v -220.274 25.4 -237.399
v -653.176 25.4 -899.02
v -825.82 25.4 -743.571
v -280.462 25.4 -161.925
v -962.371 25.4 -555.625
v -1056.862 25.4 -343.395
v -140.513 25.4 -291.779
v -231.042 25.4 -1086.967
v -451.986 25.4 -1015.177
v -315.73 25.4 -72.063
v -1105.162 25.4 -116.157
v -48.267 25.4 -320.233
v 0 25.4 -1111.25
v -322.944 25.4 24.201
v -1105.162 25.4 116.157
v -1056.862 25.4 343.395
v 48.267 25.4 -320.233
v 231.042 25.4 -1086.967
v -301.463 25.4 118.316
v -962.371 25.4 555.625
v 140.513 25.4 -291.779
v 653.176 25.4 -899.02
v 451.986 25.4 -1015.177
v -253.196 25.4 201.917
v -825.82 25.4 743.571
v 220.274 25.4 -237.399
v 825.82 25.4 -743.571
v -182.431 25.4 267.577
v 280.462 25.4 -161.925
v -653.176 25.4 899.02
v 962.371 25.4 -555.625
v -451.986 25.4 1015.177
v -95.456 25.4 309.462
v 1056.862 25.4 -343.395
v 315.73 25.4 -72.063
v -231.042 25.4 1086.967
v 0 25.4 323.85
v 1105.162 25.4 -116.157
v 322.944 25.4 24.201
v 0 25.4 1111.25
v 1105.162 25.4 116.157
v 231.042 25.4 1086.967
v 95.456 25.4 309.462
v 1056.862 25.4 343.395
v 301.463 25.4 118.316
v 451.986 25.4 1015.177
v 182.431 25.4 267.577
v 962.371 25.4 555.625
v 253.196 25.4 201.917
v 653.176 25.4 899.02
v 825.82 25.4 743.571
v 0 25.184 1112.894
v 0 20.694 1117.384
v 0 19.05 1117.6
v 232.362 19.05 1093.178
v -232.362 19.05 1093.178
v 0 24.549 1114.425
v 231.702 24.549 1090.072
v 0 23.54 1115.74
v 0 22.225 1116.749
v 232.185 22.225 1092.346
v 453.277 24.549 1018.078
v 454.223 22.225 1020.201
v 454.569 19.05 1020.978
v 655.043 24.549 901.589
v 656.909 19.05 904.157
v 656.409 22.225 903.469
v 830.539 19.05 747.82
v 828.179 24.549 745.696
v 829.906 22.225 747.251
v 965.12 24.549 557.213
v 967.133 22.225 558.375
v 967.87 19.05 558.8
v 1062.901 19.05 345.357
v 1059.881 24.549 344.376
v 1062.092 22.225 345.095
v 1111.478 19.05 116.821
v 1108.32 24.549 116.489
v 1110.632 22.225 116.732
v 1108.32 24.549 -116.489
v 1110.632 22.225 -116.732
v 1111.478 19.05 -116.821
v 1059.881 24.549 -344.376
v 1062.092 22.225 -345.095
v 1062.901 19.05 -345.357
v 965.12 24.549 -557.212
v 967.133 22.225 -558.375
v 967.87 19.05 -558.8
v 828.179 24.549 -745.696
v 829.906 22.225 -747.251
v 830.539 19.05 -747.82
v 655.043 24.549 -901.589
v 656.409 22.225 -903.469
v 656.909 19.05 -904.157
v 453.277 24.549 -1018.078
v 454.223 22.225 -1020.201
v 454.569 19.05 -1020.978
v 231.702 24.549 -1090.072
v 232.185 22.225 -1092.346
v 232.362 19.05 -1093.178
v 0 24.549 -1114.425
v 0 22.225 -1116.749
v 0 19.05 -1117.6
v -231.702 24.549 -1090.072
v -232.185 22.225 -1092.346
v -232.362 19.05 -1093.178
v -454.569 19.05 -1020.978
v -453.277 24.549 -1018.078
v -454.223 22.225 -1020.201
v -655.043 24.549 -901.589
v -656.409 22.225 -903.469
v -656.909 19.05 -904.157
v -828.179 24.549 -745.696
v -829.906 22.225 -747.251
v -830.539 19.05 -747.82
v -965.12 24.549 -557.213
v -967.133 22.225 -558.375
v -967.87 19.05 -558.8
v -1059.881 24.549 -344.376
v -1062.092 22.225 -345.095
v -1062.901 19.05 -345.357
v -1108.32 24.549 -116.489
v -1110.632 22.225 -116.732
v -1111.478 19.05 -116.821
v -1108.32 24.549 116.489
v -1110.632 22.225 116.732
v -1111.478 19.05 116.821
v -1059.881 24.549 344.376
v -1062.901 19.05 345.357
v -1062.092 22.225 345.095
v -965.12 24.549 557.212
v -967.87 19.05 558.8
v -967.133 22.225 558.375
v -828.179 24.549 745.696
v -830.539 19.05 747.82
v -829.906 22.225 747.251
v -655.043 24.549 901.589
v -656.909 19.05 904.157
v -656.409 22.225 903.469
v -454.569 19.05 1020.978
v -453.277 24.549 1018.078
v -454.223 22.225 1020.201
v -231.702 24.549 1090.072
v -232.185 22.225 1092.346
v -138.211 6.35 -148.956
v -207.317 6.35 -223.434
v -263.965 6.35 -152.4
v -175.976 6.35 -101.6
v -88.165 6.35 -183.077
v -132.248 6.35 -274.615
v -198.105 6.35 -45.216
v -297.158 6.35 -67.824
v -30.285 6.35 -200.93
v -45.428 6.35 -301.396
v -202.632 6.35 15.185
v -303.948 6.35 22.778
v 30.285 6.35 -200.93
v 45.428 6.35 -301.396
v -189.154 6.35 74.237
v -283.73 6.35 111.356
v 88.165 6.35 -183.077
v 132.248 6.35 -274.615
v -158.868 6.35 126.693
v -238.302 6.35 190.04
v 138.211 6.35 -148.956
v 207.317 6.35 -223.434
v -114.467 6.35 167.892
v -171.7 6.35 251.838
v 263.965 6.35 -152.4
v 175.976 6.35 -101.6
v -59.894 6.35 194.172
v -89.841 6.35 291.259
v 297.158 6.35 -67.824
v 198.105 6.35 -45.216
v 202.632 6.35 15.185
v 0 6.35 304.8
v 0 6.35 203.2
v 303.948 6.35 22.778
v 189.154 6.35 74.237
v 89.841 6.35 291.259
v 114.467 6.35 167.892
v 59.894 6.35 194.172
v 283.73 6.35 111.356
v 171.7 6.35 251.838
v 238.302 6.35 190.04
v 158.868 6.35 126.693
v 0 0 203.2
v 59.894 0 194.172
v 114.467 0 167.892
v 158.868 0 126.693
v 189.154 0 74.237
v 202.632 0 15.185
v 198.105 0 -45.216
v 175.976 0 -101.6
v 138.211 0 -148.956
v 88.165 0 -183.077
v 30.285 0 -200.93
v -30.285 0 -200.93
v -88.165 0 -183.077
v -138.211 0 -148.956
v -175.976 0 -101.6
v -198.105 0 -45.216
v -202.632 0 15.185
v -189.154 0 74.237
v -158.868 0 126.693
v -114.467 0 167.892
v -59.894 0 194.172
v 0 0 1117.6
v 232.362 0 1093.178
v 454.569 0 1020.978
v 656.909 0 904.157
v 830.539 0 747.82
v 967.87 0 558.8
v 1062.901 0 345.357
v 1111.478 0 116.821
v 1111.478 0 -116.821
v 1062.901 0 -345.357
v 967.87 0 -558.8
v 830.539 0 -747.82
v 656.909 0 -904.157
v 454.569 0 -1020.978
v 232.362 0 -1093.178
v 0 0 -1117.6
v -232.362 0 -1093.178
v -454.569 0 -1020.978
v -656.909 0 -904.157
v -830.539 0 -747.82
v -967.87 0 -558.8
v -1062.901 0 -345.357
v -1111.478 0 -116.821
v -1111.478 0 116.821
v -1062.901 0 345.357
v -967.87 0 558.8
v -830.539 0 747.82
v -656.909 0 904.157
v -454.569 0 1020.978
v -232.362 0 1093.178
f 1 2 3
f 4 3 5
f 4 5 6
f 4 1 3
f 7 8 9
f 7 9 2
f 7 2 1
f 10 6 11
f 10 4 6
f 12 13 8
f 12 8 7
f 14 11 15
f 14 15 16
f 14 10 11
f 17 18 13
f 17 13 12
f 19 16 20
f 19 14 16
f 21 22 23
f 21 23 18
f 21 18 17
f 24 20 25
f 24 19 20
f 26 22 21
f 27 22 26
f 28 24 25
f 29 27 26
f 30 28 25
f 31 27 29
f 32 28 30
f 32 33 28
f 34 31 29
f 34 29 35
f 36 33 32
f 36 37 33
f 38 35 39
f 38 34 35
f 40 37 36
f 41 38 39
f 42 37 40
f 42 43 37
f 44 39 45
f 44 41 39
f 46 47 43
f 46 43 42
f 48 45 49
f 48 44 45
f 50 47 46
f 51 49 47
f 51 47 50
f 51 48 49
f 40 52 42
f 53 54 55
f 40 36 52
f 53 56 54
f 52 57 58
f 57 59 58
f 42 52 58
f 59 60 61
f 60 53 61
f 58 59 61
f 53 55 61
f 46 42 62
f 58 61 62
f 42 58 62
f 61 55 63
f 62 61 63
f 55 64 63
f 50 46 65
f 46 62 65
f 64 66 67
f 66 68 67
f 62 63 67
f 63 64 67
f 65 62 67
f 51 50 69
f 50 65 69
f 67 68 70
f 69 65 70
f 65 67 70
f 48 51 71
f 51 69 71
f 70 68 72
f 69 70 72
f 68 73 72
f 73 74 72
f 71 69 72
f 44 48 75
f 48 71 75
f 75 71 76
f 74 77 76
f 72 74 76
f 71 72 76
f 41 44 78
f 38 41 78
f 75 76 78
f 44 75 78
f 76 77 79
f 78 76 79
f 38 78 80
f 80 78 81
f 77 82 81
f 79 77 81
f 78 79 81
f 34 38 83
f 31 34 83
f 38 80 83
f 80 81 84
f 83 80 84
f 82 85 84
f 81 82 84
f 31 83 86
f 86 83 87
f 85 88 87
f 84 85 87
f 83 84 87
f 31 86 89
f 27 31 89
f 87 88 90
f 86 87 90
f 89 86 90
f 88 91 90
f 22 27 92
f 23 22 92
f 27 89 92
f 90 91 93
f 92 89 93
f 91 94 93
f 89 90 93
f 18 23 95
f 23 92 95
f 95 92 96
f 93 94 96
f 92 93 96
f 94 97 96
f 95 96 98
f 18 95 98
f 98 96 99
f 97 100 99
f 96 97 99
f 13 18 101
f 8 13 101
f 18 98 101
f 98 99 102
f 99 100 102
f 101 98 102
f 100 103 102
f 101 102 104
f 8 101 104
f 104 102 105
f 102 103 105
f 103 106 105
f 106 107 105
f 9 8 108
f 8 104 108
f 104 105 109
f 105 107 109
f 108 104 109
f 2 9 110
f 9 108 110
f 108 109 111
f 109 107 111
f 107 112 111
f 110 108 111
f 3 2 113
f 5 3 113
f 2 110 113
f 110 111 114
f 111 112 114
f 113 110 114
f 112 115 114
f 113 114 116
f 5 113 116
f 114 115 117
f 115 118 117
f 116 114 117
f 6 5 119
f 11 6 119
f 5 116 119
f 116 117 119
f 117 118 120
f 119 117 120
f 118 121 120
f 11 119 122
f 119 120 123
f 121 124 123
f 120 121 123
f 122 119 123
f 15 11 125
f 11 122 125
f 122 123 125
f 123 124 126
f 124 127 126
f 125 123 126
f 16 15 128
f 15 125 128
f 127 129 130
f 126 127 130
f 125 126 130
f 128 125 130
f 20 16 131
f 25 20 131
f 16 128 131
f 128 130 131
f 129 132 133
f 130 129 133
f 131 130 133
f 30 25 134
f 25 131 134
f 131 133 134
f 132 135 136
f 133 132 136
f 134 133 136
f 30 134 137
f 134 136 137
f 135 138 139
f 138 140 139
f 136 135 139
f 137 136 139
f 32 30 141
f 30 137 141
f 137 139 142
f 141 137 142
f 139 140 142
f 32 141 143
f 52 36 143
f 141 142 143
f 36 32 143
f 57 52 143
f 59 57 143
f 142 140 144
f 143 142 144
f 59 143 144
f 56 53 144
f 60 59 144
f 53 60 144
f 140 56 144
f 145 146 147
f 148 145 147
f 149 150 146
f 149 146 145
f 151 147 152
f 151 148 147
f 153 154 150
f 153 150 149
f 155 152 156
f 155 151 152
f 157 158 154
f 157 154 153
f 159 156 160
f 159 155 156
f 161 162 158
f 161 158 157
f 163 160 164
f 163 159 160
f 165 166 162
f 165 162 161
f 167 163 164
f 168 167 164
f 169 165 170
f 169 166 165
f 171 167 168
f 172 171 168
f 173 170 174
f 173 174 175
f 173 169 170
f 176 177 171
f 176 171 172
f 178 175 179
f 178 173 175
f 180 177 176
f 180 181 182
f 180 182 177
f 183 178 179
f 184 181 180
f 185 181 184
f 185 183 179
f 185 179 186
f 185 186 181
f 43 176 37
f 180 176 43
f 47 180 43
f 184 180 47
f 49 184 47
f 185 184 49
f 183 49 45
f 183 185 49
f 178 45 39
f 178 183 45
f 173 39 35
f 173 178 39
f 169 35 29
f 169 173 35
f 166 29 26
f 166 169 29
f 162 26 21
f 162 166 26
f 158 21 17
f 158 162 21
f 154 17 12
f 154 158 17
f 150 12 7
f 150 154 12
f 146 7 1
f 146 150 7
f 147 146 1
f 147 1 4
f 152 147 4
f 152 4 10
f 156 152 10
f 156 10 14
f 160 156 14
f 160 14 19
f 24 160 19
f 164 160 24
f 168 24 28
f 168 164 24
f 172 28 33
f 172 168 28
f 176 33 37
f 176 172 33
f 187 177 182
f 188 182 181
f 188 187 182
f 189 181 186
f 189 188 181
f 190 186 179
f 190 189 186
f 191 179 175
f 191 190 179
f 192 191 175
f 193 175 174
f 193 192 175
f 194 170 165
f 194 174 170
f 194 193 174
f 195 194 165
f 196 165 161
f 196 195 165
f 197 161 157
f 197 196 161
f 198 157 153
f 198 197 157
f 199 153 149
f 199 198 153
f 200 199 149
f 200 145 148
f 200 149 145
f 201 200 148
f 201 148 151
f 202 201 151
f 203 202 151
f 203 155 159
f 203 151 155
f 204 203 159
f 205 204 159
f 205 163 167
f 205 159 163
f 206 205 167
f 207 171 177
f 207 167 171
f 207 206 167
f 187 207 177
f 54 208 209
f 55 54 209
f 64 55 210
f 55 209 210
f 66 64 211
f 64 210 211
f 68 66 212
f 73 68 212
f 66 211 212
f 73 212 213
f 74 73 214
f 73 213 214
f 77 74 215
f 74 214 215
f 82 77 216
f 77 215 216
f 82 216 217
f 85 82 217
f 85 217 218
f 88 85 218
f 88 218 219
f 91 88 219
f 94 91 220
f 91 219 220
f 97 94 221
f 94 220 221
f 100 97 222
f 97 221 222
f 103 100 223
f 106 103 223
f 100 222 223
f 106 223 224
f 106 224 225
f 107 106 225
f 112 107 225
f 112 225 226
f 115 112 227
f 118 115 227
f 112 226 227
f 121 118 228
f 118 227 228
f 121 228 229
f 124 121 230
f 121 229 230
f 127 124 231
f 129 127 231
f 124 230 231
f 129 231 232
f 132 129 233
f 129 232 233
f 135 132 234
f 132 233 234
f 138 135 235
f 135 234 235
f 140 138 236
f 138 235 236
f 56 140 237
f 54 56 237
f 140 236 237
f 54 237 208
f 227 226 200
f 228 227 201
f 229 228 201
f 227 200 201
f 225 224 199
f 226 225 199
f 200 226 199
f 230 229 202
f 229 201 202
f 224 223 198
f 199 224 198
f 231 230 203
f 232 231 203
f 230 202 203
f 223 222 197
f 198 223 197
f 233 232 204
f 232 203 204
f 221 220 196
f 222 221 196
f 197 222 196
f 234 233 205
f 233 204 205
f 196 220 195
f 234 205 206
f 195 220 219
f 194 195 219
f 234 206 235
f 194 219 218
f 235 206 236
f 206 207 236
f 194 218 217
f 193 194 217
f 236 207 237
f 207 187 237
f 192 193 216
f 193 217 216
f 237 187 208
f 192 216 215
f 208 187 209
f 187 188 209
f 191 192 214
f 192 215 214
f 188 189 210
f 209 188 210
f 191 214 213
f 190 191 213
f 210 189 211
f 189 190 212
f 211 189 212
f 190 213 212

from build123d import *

# Parameters (mm, degrees)
SKETCH1_R           = 1117.6
SKETCH1_R_2         = 203.2
BOSS_EXTRUDE1_DEPTH = 25.4
SKETCH2_R           = 304.8
CUT_EXTRUDE1_DEPTH  = 19.05
CHAMFER1_SIZE       = 19.05
FILLET1_R           = 6.35


with BuildPart() as part:
    # Sketch1 → Boss-Extrude1 (new body)
    with BuildSketch(Plane(origin=(0, 0, 0), x_dir=(1, 0, 0), z_dir=(0, 1, 0))):
        with Locations(Location((0, 0, 0), (0, 0, 270))):
            Circle(SKETCH1_R)
        with Locations(Location((0, 0, 0), (0, 0, 270))):
            Circle(SKETCH1_R_2, mode=Mode.SUBTRACT)
    extrude(amount=BOSS_EXTRUDE1_DEPTH)

    # Sketch2 → Cut-Extrude1 (cut)
    with BuildSketch(Plane(origin=(0, 25.4, 0), x_dir=(1, 0, 0), z_dir=(0, 1, 0))):
        with Locations(Location((0, 0, 0), (0, 0, 270))):
            Circle(SKETCH2_R)
    extrude(amount=-CUT_EXTRUDE1_DEPTH, mode=Mode.SUBTRACT)

    # Chamfer1
    chamfer1_edges = [part.edges().sort_by_distance(p)[0] for p in [
        (0, 25.4, -304.8),
    ]]
    chamfer(chamfer1_edges, length=CHAMFER1_SIZE - 0.0001)  # a hair under: the kernel refuses the full size

    # Fillet1
    fillet1_edges = [part.edges().sort_by_distance(p)[0] for p in [
        (0, 25.4, -1117.6),
    ]]
    fillet(fillet1_edges, radius=FILLET1_R)


solid = part.part
